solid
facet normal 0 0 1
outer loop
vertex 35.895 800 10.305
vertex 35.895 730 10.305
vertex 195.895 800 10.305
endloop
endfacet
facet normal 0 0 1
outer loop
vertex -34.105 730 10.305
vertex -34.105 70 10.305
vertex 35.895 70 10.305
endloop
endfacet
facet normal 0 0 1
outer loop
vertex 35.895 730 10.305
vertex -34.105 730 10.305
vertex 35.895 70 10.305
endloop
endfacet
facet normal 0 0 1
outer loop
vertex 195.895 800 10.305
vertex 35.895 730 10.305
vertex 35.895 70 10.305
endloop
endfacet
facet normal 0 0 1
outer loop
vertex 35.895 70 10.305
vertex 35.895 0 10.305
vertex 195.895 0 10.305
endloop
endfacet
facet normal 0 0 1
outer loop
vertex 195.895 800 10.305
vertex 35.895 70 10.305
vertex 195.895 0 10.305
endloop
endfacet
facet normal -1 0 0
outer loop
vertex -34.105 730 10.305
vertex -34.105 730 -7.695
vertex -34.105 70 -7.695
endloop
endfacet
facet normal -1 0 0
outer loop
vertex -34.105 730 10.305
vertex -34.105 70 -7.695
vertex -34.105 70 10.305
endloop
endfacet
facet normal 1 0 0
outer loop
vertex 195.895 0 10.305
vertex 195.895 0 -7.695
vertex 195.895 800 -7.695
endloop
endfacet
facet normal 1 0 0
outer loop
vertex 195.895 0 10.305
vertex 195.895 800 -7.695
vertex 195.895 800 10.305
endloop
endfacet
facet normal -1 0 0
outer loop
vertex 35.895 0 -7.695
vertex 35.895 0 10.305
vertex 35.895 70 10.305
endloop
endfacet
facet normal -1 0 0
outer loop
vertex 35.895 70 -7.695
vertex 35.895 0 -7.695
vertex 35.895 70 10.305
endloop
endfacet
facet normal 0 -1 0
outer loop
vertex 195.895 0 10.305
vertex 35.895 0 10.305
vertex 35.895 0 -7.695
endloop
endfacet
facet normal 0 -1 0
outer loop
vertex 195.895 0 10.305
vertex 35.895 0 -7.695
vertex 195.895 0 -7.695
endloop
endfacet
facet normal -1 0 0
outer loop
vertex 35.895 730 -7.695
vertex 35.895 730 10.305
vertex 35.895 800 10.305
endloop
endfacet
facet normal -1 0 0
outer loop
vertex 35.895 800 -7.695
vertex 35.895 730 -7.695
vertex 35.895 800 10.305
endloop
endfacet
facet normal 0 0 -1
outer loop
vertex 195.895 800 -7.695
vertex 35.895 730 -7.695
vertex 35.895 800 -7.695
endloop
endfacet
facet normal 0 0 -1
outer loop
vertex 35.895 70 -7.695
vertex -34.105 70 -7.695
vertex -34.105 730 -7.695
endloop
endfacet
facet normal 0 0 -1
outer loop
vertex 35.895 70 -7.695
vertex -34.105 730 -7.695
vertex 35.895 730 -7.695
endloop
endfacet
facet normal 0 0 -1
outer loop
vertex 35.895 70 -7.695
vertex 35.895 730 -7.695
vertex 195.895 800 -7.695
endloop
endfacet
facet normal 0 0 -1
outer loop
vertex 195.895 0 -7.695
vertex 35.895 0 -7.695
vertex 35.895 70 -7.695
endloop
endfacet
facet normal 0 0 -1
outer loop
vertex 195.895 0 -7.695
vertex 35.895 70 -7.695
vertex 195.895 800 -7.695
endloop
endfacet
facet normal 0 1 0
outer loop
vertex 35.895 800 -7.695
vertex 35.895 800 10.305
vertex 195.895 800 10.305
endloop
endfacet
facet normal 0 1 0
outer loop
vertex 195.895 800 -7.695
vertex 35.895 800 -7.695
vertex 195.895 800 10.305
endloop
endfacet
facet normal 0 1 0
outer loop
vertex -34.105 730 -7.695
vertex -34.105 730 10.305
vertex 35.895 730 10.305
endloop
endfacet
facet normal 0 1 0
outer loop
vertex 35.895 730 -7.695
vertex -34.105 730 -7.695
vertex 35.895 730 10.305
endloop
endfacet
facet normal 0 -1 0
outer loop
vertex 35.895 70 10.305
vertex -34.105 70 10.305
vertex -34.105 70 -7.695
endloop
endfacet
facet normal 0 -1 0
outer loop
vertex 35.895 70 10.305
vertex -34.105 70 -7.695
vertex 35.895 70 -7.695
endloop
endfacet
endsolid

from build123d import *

# Parameters (mm, degrees)
F0_W     = 230
F0_H     = 18
F1_DEPTH = 800
F2_W     = 70
F2_H     = 70
F3_DEPTH = 18
F4_W     = 70
F4_H     = 70
F5_DEPTH = 18


with BuildPart() as f1:
    # F0 (on Front) → F1 (new body)
    with BuildSketch(Plane.XZ):
        with Locations((80.894645, 1.304673)):
            Rectangle(F0_W, F0_H)
    extrude(amount=-F1_DEPTH)

    # F2 (on face) → F3 (cut)
    with BuildSketch(Plane.XY.offset(10.304673)):
        with Locations((0.894645, 765)):
            Rectangle(F2_W, F2_H)
    extrude(amount=-F3_DEPTH, mode=Mode.SUBTRACT)

    # F4 (on face) → F5 (cut)
    with BuildSketch(Plane.XY.offset(10.304673)):
        with Locations((0.894645, 35)):
            Rectangle(F4_W, F4_H)
    extrude(amount=-F5_DEPTH, mode=Mode.SUBTRACT)


solid = f1.part
